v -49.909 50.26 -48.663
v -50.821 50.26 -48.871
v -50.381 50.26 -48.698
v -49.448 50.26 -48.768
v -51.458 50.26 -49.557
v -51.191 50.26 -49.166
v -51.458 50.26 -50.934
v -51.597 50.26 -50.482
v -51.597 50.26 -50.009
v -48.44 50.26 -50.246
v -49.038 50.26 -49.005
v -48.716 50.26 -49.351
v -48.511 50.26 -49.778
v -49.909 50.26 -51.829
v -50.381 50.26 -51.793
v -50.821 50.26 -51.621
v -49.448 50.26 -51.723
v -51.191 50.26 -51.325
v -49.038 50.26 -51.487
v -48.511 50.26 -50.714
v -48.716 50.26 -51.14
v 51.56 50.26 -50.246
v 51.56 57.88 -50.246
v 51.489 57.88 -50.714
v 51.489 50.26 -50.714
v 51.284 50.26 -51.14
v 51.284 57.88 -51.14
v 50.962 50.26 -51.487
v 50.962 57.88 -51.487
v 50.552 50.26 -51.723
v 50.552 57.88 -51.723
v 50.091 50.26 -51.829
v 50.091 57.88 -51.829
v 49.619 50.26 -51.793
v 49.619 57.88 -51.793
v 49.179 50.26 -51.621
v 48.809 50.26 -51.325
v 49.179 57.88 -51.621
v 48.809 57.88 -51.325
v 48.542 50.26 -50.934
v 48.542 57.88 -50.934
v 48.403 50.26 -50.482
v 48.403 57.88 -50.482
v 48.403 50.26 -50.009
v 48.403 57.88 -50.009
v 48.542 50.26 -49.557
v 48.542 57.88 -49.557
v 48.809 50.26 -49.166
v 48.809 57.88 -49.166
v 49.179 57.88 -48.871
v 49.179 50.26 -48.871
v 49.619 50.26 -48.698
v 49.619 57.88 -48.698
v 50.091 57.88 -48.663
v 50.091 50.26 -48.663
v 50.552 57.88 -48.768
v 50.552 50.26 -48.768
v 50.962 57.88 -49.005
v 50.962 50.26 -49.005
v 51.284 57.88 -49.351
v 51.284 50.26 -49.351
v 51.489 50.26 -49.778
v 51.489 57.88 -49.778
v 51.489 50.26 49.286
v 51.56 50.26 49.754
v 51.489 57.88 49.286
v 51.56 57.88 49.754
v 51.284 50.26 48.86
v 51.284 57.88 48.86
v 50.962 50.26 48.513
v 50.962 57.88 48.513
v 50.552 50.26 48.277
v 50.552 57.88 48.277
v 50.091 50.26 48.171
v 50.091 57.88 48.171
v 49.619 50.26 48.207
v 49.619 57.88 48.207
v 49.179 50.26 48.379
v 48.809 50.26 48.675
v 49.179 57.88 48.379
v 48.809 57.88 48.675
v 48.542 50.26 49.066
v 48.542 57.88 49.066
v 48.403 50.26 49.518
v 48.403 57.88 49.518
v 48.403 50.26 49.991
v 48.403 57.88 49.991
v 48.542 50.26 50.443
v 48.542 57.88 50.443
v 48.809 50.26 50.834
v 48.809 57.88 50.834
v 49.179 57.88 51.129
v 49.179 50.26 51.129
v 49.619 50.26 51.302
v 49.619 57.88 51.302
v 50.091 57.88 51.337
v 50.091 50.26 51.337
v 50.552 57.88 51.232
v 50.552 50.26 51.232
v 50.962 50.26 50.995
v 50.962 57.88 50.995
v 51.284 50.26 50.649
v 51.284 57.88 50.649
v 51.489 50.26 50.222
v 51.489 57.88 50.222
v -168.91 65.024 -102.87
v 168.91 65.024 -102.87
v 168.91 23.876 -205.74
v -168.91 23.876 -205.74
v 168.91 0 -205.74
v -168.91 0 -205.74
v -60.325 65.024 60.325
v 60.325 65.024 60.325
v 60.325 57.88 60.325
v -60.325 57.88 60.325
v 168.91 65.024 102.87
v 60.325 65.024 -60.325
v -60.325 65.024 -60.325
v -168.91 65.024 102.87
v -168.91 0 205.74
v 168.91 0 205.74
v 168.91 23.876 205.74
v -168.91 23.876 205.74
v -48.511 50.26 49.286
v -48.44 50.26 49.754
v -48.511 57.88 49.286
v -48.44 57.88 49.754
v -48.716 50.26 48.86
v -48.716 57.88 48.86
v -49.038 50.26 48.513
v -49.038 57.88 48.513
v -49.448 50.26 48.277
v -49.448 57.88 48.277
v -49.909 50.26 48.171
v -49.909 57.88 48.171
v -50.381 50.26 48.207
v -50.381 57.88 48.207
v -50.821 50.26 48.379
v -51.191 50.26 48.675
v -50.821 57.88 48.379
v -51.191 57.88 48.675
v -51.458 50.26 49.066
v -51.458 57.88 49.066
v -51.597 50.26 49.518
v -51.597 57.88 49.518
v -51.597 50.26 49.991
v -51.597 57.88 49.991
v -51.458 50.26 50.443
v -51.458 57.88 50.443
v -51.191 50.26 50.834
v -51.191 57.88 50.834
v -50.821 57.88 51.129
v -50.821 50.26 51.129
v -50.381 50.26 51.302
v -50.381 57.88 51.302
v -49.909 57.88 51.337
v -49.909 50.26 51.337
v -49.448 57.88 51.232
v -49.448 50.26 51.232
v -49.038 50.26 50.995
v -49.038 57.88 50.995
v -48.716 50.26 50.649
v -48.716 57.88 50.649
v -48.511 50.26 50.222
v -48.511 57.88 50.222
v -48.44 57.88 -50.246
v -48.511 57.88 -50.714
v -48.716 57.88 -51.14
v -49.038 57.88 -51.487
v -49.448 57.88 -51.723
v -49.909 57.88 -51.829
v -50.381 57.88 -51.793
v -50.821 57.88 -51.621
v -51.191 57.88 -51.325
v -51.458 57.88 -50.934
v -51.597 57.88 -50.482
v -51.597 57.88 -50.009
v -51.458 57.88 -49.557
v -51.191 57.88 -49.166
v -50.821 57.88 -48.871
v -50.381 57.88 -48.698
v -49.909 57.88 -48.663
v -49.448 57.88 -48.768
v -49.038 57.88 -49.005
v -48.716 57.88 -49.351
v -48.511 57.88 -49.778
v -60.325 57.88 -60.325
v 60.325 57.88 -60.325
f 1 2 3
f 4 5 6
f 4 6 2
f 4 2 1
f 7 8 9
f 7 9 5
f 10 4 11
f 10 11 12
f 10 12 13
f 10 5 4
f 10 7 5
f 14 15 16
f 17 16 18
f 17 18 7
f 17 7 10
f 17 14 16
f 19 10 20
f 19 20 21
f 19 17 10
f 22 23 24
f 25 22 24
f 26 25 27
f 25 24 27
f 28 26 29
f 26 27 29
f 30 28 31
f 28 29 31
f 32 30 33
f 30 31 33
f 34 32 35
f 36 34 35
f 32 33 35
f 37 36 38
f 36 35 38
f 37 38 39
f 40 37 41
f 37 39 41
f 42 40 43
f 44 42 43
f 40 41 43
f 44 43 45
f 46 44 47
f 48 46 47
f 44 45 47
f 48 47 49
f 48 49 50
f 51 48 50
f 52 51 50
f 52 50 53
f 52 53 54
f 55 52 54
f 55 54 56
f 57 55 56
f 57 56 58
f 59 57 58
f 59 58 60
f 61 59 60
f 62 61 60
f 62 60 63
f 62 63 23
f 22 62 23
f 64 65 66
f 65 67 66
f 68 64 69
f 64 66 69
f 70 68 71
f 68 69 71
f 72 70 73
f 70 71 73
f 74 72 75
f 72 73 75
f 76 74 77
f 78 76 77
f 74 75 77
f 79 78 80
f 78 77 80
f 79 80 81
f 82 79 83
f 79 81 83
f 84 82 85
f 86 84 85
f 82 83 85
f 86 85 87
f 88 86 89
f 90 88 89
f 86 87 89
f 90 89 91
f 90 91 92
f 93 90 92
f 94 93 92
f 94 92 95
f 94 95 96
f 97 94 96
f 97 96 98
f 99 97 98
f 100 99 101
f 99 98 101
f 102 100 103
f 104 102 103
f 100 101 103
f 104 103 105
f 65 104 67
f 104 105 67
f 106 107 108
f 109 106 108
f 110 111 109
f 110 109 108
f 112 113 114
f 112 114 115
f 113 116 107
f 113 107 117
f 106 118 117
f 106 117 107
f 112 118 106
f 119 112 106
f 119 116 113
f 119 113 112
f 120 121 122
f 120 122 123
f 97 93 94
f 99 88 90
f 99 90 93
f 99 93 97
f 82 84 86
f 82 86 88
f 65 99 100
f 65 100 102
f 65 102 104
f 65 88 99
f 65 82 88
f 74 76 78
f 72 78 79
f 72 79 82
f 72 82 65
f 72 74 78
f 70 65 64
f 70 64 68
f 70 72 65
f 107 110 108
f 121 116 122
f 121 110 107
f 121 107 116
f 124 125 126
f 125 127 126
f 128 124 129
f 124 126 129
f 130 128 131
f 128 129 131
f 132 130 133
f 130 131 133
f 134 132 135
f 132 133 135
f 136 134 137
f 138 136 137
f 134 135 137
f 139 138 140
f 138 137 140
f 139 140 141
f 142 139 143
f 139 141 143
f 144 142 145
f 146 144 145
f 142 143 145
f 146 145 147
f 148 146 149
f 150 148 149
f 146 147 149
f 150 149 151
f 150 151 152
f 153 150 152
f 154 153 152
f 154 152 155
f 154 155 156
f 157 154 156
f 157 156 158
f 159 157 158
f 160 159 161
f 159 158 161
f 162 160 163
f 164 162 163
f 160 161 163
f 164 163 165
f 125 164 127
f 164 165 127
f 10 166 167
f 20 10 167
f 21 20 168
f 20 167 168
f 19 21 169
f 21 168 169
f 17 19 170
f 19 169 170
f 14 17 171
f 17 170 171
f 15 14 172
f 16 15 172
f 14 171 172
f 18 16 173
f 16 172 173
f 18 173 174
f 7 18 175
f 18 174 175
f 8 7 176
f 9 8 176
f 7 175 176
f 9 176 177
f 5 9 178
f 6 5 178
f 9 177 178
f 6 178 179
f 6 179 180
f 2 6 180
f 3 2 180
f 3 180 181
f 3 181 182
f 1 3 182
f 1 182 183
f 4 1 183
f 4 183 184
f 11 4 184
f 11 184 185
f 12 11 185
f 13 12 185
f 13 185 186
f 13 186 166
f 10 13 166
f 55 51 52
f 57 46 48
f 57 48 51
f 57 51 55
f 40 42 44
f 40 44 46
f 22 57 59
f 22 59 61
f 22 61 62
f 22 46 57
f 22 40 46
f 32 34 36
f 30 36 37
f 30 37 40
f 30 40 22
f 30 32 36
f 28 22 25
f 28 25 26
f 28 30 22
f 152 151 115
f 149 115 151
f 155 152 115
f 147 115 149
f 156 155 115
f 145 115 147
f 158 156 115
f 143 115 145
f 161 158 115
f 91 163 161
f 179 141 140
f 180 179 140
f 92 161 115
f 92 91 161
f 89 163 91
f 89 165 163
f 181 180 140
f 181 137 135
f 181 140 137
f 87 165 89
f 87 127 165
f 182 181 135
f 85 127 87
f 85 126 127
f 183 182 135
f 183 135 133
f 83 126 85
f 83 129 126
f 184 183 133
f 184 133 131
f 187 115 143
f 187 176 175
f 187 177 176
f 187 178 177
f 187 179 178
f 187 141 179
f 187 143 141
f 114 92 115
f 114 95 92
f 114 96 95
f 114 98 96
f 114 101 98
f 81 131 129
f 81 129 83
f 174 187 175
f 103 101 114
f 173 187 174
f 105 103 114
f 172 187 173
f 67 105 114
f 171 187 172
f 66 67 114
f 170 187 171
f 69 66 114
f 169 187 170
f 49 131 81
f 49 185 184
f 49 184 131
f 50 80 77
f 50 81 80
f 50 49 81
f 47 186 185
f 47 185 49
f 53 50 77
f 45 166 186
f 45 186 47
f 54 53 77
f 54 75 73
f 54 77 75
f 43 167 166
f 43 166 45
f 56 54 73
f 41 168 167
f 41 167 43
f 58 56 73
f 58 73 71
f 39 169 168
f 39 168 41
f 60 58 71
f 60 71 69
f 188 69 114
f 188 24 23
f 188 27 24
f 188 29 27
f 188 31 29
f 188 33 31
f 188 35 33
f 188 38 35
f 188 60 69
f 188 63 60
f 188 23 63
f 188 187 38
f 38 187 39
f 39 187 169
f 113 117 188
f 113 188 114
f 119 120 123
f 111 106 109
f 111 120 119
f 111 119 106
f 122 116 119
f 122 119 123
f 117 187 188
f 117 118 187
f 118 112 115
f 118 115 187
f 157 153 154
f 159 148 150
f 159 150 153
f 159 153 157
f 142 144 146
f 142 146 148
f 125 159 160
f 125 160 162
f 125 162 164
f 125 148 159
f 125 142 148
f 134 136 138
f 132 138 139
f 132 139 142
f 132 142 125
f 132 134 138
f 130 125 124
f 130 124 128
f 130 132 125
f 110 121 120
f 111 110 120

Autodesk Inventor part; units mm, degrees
ref_plane "YZ Plane" through (0, 0, 0) normal (1, 0, 0) x (0, 1, 0)
ref_plane "XZ Plane" through (0, 0, 0) normal (0, 1, 0) x (-1, 0, 0)
ref_plane "XY Plane" through (0, 0, 0) normal (0, 0, 1) x (1, 0, 0)
sketch "Sketch1" plane through (0, 0, 0) normal (0, 1, 0) x (-1, 0, 0)
  line L0 (-168.91, 205.74) -> (168.91, 205.74)
  line L1 (168.91, 205.74) -> (168.91, -205.74)
  line L2 (168.91, -205.74) -> (-168.91, -205.74)
  line L3 (-168.91, -205.74) -> (-168.91, 205.74)
  line L4 (-168.91, 205.74) -> (168.91, -205.74) construction
  line L5 (168.91, 205.74) -> (-168.91, -205.74) construction
  point P0 (0, 0)
  dimension "d0" = 411.48
  dimension "d1" = 337.82
extrude "Extrusion1" add sketch "Sketch1" along normal blind 65.024
sketch "Sketch2" plane through (168.91, 0, 205.74) normal (1, 0, 0) x (0, 0, -1)
  line L0 (102.87, 65.024) -> (308.61, 65.024)
  line L1 (411.48, 0) -> (411.48, 23.876)
  line L2 (308.61, 65.024) -> (411.48, 23.876)
  line L3 (411.48, 0) -> (411.48, 65.024) projected
  line L4 (308.61, 65.024) -> (411.48, 65.024)
  line L5 (411.48, 65.024) -> (411.48, 23.876)
  line L6 (102.87, 65.024) -> (0, 23.876)
  line L7 (0, 23.876) -> (0, 65.024)
  line L8 (0, 65.024) -> (102.87, 65.024)
  line L9 (411.48, 0) -> (0, 0) projected
  point P0 (205.74, 0)
  point P1 (205.74, 65.024)
  point P2 (205.74, 65.024)
  dimension "d4" = 205.74
  dimension "d5" = 23.876
  dimension "d6" = 23.876
extrude "Extrusion2" cut sketch "Sketch2" against normal blind 387.2865
sketch "Sketch3" plane through (0, 65.024, 0) normal (0, 1, 0) x (1, 0, 0)
  line L0 (60.325, -60.325) -> (-60.325, -60.325)
  line L1 (-60.325, -60.325) -> (-60.325, 60.325)
  line L2 (-60.325, 60.325) -> (60.325, 60.325)
  line L3 (60.325, 60.325) -> (60.325, -60.325)
  line L4 (60.325, -60.325) -> (-60.325, 60.325) construction
  line L5 (-60.325, -60.325) -> (60.325, 60.325) construction
  point P0 (0, 0)
  dimension "d9" = 120.65
  dimension "d10" = 120.65
extrude "Extrusion3" cut sketch "Sketch3" against normal blind 7.1437
sketch "Sketch4" plane through (0, 57.8803, 0) normal (0, 1, 0) x (1, 0, 0)
  circle A0 centre (-50.0276, 50.2457) radius 1.5875
  circle A1 centre (49.9724, 50.2457) radius 1.5875
  circle A2 centre (49.9724, -49.7543) radius 1.5875
  circle A3 centre (-50.0276, -49.7543) radius 1.5875
  point P0 (0, 0)
  dimension "d13" = 3.175
  dimension "d14" = 3.175
  dimension "d15" = 3.175
  dimension "d16" = 3.175
  dimension "d17" = 100
  dimension "d18" = 100
  dimension "d19" = 100
extrude "Extrusion4" cut sketch "Sketch4" against normal blind 7.62
properties part number "monitor (for assembly)"
